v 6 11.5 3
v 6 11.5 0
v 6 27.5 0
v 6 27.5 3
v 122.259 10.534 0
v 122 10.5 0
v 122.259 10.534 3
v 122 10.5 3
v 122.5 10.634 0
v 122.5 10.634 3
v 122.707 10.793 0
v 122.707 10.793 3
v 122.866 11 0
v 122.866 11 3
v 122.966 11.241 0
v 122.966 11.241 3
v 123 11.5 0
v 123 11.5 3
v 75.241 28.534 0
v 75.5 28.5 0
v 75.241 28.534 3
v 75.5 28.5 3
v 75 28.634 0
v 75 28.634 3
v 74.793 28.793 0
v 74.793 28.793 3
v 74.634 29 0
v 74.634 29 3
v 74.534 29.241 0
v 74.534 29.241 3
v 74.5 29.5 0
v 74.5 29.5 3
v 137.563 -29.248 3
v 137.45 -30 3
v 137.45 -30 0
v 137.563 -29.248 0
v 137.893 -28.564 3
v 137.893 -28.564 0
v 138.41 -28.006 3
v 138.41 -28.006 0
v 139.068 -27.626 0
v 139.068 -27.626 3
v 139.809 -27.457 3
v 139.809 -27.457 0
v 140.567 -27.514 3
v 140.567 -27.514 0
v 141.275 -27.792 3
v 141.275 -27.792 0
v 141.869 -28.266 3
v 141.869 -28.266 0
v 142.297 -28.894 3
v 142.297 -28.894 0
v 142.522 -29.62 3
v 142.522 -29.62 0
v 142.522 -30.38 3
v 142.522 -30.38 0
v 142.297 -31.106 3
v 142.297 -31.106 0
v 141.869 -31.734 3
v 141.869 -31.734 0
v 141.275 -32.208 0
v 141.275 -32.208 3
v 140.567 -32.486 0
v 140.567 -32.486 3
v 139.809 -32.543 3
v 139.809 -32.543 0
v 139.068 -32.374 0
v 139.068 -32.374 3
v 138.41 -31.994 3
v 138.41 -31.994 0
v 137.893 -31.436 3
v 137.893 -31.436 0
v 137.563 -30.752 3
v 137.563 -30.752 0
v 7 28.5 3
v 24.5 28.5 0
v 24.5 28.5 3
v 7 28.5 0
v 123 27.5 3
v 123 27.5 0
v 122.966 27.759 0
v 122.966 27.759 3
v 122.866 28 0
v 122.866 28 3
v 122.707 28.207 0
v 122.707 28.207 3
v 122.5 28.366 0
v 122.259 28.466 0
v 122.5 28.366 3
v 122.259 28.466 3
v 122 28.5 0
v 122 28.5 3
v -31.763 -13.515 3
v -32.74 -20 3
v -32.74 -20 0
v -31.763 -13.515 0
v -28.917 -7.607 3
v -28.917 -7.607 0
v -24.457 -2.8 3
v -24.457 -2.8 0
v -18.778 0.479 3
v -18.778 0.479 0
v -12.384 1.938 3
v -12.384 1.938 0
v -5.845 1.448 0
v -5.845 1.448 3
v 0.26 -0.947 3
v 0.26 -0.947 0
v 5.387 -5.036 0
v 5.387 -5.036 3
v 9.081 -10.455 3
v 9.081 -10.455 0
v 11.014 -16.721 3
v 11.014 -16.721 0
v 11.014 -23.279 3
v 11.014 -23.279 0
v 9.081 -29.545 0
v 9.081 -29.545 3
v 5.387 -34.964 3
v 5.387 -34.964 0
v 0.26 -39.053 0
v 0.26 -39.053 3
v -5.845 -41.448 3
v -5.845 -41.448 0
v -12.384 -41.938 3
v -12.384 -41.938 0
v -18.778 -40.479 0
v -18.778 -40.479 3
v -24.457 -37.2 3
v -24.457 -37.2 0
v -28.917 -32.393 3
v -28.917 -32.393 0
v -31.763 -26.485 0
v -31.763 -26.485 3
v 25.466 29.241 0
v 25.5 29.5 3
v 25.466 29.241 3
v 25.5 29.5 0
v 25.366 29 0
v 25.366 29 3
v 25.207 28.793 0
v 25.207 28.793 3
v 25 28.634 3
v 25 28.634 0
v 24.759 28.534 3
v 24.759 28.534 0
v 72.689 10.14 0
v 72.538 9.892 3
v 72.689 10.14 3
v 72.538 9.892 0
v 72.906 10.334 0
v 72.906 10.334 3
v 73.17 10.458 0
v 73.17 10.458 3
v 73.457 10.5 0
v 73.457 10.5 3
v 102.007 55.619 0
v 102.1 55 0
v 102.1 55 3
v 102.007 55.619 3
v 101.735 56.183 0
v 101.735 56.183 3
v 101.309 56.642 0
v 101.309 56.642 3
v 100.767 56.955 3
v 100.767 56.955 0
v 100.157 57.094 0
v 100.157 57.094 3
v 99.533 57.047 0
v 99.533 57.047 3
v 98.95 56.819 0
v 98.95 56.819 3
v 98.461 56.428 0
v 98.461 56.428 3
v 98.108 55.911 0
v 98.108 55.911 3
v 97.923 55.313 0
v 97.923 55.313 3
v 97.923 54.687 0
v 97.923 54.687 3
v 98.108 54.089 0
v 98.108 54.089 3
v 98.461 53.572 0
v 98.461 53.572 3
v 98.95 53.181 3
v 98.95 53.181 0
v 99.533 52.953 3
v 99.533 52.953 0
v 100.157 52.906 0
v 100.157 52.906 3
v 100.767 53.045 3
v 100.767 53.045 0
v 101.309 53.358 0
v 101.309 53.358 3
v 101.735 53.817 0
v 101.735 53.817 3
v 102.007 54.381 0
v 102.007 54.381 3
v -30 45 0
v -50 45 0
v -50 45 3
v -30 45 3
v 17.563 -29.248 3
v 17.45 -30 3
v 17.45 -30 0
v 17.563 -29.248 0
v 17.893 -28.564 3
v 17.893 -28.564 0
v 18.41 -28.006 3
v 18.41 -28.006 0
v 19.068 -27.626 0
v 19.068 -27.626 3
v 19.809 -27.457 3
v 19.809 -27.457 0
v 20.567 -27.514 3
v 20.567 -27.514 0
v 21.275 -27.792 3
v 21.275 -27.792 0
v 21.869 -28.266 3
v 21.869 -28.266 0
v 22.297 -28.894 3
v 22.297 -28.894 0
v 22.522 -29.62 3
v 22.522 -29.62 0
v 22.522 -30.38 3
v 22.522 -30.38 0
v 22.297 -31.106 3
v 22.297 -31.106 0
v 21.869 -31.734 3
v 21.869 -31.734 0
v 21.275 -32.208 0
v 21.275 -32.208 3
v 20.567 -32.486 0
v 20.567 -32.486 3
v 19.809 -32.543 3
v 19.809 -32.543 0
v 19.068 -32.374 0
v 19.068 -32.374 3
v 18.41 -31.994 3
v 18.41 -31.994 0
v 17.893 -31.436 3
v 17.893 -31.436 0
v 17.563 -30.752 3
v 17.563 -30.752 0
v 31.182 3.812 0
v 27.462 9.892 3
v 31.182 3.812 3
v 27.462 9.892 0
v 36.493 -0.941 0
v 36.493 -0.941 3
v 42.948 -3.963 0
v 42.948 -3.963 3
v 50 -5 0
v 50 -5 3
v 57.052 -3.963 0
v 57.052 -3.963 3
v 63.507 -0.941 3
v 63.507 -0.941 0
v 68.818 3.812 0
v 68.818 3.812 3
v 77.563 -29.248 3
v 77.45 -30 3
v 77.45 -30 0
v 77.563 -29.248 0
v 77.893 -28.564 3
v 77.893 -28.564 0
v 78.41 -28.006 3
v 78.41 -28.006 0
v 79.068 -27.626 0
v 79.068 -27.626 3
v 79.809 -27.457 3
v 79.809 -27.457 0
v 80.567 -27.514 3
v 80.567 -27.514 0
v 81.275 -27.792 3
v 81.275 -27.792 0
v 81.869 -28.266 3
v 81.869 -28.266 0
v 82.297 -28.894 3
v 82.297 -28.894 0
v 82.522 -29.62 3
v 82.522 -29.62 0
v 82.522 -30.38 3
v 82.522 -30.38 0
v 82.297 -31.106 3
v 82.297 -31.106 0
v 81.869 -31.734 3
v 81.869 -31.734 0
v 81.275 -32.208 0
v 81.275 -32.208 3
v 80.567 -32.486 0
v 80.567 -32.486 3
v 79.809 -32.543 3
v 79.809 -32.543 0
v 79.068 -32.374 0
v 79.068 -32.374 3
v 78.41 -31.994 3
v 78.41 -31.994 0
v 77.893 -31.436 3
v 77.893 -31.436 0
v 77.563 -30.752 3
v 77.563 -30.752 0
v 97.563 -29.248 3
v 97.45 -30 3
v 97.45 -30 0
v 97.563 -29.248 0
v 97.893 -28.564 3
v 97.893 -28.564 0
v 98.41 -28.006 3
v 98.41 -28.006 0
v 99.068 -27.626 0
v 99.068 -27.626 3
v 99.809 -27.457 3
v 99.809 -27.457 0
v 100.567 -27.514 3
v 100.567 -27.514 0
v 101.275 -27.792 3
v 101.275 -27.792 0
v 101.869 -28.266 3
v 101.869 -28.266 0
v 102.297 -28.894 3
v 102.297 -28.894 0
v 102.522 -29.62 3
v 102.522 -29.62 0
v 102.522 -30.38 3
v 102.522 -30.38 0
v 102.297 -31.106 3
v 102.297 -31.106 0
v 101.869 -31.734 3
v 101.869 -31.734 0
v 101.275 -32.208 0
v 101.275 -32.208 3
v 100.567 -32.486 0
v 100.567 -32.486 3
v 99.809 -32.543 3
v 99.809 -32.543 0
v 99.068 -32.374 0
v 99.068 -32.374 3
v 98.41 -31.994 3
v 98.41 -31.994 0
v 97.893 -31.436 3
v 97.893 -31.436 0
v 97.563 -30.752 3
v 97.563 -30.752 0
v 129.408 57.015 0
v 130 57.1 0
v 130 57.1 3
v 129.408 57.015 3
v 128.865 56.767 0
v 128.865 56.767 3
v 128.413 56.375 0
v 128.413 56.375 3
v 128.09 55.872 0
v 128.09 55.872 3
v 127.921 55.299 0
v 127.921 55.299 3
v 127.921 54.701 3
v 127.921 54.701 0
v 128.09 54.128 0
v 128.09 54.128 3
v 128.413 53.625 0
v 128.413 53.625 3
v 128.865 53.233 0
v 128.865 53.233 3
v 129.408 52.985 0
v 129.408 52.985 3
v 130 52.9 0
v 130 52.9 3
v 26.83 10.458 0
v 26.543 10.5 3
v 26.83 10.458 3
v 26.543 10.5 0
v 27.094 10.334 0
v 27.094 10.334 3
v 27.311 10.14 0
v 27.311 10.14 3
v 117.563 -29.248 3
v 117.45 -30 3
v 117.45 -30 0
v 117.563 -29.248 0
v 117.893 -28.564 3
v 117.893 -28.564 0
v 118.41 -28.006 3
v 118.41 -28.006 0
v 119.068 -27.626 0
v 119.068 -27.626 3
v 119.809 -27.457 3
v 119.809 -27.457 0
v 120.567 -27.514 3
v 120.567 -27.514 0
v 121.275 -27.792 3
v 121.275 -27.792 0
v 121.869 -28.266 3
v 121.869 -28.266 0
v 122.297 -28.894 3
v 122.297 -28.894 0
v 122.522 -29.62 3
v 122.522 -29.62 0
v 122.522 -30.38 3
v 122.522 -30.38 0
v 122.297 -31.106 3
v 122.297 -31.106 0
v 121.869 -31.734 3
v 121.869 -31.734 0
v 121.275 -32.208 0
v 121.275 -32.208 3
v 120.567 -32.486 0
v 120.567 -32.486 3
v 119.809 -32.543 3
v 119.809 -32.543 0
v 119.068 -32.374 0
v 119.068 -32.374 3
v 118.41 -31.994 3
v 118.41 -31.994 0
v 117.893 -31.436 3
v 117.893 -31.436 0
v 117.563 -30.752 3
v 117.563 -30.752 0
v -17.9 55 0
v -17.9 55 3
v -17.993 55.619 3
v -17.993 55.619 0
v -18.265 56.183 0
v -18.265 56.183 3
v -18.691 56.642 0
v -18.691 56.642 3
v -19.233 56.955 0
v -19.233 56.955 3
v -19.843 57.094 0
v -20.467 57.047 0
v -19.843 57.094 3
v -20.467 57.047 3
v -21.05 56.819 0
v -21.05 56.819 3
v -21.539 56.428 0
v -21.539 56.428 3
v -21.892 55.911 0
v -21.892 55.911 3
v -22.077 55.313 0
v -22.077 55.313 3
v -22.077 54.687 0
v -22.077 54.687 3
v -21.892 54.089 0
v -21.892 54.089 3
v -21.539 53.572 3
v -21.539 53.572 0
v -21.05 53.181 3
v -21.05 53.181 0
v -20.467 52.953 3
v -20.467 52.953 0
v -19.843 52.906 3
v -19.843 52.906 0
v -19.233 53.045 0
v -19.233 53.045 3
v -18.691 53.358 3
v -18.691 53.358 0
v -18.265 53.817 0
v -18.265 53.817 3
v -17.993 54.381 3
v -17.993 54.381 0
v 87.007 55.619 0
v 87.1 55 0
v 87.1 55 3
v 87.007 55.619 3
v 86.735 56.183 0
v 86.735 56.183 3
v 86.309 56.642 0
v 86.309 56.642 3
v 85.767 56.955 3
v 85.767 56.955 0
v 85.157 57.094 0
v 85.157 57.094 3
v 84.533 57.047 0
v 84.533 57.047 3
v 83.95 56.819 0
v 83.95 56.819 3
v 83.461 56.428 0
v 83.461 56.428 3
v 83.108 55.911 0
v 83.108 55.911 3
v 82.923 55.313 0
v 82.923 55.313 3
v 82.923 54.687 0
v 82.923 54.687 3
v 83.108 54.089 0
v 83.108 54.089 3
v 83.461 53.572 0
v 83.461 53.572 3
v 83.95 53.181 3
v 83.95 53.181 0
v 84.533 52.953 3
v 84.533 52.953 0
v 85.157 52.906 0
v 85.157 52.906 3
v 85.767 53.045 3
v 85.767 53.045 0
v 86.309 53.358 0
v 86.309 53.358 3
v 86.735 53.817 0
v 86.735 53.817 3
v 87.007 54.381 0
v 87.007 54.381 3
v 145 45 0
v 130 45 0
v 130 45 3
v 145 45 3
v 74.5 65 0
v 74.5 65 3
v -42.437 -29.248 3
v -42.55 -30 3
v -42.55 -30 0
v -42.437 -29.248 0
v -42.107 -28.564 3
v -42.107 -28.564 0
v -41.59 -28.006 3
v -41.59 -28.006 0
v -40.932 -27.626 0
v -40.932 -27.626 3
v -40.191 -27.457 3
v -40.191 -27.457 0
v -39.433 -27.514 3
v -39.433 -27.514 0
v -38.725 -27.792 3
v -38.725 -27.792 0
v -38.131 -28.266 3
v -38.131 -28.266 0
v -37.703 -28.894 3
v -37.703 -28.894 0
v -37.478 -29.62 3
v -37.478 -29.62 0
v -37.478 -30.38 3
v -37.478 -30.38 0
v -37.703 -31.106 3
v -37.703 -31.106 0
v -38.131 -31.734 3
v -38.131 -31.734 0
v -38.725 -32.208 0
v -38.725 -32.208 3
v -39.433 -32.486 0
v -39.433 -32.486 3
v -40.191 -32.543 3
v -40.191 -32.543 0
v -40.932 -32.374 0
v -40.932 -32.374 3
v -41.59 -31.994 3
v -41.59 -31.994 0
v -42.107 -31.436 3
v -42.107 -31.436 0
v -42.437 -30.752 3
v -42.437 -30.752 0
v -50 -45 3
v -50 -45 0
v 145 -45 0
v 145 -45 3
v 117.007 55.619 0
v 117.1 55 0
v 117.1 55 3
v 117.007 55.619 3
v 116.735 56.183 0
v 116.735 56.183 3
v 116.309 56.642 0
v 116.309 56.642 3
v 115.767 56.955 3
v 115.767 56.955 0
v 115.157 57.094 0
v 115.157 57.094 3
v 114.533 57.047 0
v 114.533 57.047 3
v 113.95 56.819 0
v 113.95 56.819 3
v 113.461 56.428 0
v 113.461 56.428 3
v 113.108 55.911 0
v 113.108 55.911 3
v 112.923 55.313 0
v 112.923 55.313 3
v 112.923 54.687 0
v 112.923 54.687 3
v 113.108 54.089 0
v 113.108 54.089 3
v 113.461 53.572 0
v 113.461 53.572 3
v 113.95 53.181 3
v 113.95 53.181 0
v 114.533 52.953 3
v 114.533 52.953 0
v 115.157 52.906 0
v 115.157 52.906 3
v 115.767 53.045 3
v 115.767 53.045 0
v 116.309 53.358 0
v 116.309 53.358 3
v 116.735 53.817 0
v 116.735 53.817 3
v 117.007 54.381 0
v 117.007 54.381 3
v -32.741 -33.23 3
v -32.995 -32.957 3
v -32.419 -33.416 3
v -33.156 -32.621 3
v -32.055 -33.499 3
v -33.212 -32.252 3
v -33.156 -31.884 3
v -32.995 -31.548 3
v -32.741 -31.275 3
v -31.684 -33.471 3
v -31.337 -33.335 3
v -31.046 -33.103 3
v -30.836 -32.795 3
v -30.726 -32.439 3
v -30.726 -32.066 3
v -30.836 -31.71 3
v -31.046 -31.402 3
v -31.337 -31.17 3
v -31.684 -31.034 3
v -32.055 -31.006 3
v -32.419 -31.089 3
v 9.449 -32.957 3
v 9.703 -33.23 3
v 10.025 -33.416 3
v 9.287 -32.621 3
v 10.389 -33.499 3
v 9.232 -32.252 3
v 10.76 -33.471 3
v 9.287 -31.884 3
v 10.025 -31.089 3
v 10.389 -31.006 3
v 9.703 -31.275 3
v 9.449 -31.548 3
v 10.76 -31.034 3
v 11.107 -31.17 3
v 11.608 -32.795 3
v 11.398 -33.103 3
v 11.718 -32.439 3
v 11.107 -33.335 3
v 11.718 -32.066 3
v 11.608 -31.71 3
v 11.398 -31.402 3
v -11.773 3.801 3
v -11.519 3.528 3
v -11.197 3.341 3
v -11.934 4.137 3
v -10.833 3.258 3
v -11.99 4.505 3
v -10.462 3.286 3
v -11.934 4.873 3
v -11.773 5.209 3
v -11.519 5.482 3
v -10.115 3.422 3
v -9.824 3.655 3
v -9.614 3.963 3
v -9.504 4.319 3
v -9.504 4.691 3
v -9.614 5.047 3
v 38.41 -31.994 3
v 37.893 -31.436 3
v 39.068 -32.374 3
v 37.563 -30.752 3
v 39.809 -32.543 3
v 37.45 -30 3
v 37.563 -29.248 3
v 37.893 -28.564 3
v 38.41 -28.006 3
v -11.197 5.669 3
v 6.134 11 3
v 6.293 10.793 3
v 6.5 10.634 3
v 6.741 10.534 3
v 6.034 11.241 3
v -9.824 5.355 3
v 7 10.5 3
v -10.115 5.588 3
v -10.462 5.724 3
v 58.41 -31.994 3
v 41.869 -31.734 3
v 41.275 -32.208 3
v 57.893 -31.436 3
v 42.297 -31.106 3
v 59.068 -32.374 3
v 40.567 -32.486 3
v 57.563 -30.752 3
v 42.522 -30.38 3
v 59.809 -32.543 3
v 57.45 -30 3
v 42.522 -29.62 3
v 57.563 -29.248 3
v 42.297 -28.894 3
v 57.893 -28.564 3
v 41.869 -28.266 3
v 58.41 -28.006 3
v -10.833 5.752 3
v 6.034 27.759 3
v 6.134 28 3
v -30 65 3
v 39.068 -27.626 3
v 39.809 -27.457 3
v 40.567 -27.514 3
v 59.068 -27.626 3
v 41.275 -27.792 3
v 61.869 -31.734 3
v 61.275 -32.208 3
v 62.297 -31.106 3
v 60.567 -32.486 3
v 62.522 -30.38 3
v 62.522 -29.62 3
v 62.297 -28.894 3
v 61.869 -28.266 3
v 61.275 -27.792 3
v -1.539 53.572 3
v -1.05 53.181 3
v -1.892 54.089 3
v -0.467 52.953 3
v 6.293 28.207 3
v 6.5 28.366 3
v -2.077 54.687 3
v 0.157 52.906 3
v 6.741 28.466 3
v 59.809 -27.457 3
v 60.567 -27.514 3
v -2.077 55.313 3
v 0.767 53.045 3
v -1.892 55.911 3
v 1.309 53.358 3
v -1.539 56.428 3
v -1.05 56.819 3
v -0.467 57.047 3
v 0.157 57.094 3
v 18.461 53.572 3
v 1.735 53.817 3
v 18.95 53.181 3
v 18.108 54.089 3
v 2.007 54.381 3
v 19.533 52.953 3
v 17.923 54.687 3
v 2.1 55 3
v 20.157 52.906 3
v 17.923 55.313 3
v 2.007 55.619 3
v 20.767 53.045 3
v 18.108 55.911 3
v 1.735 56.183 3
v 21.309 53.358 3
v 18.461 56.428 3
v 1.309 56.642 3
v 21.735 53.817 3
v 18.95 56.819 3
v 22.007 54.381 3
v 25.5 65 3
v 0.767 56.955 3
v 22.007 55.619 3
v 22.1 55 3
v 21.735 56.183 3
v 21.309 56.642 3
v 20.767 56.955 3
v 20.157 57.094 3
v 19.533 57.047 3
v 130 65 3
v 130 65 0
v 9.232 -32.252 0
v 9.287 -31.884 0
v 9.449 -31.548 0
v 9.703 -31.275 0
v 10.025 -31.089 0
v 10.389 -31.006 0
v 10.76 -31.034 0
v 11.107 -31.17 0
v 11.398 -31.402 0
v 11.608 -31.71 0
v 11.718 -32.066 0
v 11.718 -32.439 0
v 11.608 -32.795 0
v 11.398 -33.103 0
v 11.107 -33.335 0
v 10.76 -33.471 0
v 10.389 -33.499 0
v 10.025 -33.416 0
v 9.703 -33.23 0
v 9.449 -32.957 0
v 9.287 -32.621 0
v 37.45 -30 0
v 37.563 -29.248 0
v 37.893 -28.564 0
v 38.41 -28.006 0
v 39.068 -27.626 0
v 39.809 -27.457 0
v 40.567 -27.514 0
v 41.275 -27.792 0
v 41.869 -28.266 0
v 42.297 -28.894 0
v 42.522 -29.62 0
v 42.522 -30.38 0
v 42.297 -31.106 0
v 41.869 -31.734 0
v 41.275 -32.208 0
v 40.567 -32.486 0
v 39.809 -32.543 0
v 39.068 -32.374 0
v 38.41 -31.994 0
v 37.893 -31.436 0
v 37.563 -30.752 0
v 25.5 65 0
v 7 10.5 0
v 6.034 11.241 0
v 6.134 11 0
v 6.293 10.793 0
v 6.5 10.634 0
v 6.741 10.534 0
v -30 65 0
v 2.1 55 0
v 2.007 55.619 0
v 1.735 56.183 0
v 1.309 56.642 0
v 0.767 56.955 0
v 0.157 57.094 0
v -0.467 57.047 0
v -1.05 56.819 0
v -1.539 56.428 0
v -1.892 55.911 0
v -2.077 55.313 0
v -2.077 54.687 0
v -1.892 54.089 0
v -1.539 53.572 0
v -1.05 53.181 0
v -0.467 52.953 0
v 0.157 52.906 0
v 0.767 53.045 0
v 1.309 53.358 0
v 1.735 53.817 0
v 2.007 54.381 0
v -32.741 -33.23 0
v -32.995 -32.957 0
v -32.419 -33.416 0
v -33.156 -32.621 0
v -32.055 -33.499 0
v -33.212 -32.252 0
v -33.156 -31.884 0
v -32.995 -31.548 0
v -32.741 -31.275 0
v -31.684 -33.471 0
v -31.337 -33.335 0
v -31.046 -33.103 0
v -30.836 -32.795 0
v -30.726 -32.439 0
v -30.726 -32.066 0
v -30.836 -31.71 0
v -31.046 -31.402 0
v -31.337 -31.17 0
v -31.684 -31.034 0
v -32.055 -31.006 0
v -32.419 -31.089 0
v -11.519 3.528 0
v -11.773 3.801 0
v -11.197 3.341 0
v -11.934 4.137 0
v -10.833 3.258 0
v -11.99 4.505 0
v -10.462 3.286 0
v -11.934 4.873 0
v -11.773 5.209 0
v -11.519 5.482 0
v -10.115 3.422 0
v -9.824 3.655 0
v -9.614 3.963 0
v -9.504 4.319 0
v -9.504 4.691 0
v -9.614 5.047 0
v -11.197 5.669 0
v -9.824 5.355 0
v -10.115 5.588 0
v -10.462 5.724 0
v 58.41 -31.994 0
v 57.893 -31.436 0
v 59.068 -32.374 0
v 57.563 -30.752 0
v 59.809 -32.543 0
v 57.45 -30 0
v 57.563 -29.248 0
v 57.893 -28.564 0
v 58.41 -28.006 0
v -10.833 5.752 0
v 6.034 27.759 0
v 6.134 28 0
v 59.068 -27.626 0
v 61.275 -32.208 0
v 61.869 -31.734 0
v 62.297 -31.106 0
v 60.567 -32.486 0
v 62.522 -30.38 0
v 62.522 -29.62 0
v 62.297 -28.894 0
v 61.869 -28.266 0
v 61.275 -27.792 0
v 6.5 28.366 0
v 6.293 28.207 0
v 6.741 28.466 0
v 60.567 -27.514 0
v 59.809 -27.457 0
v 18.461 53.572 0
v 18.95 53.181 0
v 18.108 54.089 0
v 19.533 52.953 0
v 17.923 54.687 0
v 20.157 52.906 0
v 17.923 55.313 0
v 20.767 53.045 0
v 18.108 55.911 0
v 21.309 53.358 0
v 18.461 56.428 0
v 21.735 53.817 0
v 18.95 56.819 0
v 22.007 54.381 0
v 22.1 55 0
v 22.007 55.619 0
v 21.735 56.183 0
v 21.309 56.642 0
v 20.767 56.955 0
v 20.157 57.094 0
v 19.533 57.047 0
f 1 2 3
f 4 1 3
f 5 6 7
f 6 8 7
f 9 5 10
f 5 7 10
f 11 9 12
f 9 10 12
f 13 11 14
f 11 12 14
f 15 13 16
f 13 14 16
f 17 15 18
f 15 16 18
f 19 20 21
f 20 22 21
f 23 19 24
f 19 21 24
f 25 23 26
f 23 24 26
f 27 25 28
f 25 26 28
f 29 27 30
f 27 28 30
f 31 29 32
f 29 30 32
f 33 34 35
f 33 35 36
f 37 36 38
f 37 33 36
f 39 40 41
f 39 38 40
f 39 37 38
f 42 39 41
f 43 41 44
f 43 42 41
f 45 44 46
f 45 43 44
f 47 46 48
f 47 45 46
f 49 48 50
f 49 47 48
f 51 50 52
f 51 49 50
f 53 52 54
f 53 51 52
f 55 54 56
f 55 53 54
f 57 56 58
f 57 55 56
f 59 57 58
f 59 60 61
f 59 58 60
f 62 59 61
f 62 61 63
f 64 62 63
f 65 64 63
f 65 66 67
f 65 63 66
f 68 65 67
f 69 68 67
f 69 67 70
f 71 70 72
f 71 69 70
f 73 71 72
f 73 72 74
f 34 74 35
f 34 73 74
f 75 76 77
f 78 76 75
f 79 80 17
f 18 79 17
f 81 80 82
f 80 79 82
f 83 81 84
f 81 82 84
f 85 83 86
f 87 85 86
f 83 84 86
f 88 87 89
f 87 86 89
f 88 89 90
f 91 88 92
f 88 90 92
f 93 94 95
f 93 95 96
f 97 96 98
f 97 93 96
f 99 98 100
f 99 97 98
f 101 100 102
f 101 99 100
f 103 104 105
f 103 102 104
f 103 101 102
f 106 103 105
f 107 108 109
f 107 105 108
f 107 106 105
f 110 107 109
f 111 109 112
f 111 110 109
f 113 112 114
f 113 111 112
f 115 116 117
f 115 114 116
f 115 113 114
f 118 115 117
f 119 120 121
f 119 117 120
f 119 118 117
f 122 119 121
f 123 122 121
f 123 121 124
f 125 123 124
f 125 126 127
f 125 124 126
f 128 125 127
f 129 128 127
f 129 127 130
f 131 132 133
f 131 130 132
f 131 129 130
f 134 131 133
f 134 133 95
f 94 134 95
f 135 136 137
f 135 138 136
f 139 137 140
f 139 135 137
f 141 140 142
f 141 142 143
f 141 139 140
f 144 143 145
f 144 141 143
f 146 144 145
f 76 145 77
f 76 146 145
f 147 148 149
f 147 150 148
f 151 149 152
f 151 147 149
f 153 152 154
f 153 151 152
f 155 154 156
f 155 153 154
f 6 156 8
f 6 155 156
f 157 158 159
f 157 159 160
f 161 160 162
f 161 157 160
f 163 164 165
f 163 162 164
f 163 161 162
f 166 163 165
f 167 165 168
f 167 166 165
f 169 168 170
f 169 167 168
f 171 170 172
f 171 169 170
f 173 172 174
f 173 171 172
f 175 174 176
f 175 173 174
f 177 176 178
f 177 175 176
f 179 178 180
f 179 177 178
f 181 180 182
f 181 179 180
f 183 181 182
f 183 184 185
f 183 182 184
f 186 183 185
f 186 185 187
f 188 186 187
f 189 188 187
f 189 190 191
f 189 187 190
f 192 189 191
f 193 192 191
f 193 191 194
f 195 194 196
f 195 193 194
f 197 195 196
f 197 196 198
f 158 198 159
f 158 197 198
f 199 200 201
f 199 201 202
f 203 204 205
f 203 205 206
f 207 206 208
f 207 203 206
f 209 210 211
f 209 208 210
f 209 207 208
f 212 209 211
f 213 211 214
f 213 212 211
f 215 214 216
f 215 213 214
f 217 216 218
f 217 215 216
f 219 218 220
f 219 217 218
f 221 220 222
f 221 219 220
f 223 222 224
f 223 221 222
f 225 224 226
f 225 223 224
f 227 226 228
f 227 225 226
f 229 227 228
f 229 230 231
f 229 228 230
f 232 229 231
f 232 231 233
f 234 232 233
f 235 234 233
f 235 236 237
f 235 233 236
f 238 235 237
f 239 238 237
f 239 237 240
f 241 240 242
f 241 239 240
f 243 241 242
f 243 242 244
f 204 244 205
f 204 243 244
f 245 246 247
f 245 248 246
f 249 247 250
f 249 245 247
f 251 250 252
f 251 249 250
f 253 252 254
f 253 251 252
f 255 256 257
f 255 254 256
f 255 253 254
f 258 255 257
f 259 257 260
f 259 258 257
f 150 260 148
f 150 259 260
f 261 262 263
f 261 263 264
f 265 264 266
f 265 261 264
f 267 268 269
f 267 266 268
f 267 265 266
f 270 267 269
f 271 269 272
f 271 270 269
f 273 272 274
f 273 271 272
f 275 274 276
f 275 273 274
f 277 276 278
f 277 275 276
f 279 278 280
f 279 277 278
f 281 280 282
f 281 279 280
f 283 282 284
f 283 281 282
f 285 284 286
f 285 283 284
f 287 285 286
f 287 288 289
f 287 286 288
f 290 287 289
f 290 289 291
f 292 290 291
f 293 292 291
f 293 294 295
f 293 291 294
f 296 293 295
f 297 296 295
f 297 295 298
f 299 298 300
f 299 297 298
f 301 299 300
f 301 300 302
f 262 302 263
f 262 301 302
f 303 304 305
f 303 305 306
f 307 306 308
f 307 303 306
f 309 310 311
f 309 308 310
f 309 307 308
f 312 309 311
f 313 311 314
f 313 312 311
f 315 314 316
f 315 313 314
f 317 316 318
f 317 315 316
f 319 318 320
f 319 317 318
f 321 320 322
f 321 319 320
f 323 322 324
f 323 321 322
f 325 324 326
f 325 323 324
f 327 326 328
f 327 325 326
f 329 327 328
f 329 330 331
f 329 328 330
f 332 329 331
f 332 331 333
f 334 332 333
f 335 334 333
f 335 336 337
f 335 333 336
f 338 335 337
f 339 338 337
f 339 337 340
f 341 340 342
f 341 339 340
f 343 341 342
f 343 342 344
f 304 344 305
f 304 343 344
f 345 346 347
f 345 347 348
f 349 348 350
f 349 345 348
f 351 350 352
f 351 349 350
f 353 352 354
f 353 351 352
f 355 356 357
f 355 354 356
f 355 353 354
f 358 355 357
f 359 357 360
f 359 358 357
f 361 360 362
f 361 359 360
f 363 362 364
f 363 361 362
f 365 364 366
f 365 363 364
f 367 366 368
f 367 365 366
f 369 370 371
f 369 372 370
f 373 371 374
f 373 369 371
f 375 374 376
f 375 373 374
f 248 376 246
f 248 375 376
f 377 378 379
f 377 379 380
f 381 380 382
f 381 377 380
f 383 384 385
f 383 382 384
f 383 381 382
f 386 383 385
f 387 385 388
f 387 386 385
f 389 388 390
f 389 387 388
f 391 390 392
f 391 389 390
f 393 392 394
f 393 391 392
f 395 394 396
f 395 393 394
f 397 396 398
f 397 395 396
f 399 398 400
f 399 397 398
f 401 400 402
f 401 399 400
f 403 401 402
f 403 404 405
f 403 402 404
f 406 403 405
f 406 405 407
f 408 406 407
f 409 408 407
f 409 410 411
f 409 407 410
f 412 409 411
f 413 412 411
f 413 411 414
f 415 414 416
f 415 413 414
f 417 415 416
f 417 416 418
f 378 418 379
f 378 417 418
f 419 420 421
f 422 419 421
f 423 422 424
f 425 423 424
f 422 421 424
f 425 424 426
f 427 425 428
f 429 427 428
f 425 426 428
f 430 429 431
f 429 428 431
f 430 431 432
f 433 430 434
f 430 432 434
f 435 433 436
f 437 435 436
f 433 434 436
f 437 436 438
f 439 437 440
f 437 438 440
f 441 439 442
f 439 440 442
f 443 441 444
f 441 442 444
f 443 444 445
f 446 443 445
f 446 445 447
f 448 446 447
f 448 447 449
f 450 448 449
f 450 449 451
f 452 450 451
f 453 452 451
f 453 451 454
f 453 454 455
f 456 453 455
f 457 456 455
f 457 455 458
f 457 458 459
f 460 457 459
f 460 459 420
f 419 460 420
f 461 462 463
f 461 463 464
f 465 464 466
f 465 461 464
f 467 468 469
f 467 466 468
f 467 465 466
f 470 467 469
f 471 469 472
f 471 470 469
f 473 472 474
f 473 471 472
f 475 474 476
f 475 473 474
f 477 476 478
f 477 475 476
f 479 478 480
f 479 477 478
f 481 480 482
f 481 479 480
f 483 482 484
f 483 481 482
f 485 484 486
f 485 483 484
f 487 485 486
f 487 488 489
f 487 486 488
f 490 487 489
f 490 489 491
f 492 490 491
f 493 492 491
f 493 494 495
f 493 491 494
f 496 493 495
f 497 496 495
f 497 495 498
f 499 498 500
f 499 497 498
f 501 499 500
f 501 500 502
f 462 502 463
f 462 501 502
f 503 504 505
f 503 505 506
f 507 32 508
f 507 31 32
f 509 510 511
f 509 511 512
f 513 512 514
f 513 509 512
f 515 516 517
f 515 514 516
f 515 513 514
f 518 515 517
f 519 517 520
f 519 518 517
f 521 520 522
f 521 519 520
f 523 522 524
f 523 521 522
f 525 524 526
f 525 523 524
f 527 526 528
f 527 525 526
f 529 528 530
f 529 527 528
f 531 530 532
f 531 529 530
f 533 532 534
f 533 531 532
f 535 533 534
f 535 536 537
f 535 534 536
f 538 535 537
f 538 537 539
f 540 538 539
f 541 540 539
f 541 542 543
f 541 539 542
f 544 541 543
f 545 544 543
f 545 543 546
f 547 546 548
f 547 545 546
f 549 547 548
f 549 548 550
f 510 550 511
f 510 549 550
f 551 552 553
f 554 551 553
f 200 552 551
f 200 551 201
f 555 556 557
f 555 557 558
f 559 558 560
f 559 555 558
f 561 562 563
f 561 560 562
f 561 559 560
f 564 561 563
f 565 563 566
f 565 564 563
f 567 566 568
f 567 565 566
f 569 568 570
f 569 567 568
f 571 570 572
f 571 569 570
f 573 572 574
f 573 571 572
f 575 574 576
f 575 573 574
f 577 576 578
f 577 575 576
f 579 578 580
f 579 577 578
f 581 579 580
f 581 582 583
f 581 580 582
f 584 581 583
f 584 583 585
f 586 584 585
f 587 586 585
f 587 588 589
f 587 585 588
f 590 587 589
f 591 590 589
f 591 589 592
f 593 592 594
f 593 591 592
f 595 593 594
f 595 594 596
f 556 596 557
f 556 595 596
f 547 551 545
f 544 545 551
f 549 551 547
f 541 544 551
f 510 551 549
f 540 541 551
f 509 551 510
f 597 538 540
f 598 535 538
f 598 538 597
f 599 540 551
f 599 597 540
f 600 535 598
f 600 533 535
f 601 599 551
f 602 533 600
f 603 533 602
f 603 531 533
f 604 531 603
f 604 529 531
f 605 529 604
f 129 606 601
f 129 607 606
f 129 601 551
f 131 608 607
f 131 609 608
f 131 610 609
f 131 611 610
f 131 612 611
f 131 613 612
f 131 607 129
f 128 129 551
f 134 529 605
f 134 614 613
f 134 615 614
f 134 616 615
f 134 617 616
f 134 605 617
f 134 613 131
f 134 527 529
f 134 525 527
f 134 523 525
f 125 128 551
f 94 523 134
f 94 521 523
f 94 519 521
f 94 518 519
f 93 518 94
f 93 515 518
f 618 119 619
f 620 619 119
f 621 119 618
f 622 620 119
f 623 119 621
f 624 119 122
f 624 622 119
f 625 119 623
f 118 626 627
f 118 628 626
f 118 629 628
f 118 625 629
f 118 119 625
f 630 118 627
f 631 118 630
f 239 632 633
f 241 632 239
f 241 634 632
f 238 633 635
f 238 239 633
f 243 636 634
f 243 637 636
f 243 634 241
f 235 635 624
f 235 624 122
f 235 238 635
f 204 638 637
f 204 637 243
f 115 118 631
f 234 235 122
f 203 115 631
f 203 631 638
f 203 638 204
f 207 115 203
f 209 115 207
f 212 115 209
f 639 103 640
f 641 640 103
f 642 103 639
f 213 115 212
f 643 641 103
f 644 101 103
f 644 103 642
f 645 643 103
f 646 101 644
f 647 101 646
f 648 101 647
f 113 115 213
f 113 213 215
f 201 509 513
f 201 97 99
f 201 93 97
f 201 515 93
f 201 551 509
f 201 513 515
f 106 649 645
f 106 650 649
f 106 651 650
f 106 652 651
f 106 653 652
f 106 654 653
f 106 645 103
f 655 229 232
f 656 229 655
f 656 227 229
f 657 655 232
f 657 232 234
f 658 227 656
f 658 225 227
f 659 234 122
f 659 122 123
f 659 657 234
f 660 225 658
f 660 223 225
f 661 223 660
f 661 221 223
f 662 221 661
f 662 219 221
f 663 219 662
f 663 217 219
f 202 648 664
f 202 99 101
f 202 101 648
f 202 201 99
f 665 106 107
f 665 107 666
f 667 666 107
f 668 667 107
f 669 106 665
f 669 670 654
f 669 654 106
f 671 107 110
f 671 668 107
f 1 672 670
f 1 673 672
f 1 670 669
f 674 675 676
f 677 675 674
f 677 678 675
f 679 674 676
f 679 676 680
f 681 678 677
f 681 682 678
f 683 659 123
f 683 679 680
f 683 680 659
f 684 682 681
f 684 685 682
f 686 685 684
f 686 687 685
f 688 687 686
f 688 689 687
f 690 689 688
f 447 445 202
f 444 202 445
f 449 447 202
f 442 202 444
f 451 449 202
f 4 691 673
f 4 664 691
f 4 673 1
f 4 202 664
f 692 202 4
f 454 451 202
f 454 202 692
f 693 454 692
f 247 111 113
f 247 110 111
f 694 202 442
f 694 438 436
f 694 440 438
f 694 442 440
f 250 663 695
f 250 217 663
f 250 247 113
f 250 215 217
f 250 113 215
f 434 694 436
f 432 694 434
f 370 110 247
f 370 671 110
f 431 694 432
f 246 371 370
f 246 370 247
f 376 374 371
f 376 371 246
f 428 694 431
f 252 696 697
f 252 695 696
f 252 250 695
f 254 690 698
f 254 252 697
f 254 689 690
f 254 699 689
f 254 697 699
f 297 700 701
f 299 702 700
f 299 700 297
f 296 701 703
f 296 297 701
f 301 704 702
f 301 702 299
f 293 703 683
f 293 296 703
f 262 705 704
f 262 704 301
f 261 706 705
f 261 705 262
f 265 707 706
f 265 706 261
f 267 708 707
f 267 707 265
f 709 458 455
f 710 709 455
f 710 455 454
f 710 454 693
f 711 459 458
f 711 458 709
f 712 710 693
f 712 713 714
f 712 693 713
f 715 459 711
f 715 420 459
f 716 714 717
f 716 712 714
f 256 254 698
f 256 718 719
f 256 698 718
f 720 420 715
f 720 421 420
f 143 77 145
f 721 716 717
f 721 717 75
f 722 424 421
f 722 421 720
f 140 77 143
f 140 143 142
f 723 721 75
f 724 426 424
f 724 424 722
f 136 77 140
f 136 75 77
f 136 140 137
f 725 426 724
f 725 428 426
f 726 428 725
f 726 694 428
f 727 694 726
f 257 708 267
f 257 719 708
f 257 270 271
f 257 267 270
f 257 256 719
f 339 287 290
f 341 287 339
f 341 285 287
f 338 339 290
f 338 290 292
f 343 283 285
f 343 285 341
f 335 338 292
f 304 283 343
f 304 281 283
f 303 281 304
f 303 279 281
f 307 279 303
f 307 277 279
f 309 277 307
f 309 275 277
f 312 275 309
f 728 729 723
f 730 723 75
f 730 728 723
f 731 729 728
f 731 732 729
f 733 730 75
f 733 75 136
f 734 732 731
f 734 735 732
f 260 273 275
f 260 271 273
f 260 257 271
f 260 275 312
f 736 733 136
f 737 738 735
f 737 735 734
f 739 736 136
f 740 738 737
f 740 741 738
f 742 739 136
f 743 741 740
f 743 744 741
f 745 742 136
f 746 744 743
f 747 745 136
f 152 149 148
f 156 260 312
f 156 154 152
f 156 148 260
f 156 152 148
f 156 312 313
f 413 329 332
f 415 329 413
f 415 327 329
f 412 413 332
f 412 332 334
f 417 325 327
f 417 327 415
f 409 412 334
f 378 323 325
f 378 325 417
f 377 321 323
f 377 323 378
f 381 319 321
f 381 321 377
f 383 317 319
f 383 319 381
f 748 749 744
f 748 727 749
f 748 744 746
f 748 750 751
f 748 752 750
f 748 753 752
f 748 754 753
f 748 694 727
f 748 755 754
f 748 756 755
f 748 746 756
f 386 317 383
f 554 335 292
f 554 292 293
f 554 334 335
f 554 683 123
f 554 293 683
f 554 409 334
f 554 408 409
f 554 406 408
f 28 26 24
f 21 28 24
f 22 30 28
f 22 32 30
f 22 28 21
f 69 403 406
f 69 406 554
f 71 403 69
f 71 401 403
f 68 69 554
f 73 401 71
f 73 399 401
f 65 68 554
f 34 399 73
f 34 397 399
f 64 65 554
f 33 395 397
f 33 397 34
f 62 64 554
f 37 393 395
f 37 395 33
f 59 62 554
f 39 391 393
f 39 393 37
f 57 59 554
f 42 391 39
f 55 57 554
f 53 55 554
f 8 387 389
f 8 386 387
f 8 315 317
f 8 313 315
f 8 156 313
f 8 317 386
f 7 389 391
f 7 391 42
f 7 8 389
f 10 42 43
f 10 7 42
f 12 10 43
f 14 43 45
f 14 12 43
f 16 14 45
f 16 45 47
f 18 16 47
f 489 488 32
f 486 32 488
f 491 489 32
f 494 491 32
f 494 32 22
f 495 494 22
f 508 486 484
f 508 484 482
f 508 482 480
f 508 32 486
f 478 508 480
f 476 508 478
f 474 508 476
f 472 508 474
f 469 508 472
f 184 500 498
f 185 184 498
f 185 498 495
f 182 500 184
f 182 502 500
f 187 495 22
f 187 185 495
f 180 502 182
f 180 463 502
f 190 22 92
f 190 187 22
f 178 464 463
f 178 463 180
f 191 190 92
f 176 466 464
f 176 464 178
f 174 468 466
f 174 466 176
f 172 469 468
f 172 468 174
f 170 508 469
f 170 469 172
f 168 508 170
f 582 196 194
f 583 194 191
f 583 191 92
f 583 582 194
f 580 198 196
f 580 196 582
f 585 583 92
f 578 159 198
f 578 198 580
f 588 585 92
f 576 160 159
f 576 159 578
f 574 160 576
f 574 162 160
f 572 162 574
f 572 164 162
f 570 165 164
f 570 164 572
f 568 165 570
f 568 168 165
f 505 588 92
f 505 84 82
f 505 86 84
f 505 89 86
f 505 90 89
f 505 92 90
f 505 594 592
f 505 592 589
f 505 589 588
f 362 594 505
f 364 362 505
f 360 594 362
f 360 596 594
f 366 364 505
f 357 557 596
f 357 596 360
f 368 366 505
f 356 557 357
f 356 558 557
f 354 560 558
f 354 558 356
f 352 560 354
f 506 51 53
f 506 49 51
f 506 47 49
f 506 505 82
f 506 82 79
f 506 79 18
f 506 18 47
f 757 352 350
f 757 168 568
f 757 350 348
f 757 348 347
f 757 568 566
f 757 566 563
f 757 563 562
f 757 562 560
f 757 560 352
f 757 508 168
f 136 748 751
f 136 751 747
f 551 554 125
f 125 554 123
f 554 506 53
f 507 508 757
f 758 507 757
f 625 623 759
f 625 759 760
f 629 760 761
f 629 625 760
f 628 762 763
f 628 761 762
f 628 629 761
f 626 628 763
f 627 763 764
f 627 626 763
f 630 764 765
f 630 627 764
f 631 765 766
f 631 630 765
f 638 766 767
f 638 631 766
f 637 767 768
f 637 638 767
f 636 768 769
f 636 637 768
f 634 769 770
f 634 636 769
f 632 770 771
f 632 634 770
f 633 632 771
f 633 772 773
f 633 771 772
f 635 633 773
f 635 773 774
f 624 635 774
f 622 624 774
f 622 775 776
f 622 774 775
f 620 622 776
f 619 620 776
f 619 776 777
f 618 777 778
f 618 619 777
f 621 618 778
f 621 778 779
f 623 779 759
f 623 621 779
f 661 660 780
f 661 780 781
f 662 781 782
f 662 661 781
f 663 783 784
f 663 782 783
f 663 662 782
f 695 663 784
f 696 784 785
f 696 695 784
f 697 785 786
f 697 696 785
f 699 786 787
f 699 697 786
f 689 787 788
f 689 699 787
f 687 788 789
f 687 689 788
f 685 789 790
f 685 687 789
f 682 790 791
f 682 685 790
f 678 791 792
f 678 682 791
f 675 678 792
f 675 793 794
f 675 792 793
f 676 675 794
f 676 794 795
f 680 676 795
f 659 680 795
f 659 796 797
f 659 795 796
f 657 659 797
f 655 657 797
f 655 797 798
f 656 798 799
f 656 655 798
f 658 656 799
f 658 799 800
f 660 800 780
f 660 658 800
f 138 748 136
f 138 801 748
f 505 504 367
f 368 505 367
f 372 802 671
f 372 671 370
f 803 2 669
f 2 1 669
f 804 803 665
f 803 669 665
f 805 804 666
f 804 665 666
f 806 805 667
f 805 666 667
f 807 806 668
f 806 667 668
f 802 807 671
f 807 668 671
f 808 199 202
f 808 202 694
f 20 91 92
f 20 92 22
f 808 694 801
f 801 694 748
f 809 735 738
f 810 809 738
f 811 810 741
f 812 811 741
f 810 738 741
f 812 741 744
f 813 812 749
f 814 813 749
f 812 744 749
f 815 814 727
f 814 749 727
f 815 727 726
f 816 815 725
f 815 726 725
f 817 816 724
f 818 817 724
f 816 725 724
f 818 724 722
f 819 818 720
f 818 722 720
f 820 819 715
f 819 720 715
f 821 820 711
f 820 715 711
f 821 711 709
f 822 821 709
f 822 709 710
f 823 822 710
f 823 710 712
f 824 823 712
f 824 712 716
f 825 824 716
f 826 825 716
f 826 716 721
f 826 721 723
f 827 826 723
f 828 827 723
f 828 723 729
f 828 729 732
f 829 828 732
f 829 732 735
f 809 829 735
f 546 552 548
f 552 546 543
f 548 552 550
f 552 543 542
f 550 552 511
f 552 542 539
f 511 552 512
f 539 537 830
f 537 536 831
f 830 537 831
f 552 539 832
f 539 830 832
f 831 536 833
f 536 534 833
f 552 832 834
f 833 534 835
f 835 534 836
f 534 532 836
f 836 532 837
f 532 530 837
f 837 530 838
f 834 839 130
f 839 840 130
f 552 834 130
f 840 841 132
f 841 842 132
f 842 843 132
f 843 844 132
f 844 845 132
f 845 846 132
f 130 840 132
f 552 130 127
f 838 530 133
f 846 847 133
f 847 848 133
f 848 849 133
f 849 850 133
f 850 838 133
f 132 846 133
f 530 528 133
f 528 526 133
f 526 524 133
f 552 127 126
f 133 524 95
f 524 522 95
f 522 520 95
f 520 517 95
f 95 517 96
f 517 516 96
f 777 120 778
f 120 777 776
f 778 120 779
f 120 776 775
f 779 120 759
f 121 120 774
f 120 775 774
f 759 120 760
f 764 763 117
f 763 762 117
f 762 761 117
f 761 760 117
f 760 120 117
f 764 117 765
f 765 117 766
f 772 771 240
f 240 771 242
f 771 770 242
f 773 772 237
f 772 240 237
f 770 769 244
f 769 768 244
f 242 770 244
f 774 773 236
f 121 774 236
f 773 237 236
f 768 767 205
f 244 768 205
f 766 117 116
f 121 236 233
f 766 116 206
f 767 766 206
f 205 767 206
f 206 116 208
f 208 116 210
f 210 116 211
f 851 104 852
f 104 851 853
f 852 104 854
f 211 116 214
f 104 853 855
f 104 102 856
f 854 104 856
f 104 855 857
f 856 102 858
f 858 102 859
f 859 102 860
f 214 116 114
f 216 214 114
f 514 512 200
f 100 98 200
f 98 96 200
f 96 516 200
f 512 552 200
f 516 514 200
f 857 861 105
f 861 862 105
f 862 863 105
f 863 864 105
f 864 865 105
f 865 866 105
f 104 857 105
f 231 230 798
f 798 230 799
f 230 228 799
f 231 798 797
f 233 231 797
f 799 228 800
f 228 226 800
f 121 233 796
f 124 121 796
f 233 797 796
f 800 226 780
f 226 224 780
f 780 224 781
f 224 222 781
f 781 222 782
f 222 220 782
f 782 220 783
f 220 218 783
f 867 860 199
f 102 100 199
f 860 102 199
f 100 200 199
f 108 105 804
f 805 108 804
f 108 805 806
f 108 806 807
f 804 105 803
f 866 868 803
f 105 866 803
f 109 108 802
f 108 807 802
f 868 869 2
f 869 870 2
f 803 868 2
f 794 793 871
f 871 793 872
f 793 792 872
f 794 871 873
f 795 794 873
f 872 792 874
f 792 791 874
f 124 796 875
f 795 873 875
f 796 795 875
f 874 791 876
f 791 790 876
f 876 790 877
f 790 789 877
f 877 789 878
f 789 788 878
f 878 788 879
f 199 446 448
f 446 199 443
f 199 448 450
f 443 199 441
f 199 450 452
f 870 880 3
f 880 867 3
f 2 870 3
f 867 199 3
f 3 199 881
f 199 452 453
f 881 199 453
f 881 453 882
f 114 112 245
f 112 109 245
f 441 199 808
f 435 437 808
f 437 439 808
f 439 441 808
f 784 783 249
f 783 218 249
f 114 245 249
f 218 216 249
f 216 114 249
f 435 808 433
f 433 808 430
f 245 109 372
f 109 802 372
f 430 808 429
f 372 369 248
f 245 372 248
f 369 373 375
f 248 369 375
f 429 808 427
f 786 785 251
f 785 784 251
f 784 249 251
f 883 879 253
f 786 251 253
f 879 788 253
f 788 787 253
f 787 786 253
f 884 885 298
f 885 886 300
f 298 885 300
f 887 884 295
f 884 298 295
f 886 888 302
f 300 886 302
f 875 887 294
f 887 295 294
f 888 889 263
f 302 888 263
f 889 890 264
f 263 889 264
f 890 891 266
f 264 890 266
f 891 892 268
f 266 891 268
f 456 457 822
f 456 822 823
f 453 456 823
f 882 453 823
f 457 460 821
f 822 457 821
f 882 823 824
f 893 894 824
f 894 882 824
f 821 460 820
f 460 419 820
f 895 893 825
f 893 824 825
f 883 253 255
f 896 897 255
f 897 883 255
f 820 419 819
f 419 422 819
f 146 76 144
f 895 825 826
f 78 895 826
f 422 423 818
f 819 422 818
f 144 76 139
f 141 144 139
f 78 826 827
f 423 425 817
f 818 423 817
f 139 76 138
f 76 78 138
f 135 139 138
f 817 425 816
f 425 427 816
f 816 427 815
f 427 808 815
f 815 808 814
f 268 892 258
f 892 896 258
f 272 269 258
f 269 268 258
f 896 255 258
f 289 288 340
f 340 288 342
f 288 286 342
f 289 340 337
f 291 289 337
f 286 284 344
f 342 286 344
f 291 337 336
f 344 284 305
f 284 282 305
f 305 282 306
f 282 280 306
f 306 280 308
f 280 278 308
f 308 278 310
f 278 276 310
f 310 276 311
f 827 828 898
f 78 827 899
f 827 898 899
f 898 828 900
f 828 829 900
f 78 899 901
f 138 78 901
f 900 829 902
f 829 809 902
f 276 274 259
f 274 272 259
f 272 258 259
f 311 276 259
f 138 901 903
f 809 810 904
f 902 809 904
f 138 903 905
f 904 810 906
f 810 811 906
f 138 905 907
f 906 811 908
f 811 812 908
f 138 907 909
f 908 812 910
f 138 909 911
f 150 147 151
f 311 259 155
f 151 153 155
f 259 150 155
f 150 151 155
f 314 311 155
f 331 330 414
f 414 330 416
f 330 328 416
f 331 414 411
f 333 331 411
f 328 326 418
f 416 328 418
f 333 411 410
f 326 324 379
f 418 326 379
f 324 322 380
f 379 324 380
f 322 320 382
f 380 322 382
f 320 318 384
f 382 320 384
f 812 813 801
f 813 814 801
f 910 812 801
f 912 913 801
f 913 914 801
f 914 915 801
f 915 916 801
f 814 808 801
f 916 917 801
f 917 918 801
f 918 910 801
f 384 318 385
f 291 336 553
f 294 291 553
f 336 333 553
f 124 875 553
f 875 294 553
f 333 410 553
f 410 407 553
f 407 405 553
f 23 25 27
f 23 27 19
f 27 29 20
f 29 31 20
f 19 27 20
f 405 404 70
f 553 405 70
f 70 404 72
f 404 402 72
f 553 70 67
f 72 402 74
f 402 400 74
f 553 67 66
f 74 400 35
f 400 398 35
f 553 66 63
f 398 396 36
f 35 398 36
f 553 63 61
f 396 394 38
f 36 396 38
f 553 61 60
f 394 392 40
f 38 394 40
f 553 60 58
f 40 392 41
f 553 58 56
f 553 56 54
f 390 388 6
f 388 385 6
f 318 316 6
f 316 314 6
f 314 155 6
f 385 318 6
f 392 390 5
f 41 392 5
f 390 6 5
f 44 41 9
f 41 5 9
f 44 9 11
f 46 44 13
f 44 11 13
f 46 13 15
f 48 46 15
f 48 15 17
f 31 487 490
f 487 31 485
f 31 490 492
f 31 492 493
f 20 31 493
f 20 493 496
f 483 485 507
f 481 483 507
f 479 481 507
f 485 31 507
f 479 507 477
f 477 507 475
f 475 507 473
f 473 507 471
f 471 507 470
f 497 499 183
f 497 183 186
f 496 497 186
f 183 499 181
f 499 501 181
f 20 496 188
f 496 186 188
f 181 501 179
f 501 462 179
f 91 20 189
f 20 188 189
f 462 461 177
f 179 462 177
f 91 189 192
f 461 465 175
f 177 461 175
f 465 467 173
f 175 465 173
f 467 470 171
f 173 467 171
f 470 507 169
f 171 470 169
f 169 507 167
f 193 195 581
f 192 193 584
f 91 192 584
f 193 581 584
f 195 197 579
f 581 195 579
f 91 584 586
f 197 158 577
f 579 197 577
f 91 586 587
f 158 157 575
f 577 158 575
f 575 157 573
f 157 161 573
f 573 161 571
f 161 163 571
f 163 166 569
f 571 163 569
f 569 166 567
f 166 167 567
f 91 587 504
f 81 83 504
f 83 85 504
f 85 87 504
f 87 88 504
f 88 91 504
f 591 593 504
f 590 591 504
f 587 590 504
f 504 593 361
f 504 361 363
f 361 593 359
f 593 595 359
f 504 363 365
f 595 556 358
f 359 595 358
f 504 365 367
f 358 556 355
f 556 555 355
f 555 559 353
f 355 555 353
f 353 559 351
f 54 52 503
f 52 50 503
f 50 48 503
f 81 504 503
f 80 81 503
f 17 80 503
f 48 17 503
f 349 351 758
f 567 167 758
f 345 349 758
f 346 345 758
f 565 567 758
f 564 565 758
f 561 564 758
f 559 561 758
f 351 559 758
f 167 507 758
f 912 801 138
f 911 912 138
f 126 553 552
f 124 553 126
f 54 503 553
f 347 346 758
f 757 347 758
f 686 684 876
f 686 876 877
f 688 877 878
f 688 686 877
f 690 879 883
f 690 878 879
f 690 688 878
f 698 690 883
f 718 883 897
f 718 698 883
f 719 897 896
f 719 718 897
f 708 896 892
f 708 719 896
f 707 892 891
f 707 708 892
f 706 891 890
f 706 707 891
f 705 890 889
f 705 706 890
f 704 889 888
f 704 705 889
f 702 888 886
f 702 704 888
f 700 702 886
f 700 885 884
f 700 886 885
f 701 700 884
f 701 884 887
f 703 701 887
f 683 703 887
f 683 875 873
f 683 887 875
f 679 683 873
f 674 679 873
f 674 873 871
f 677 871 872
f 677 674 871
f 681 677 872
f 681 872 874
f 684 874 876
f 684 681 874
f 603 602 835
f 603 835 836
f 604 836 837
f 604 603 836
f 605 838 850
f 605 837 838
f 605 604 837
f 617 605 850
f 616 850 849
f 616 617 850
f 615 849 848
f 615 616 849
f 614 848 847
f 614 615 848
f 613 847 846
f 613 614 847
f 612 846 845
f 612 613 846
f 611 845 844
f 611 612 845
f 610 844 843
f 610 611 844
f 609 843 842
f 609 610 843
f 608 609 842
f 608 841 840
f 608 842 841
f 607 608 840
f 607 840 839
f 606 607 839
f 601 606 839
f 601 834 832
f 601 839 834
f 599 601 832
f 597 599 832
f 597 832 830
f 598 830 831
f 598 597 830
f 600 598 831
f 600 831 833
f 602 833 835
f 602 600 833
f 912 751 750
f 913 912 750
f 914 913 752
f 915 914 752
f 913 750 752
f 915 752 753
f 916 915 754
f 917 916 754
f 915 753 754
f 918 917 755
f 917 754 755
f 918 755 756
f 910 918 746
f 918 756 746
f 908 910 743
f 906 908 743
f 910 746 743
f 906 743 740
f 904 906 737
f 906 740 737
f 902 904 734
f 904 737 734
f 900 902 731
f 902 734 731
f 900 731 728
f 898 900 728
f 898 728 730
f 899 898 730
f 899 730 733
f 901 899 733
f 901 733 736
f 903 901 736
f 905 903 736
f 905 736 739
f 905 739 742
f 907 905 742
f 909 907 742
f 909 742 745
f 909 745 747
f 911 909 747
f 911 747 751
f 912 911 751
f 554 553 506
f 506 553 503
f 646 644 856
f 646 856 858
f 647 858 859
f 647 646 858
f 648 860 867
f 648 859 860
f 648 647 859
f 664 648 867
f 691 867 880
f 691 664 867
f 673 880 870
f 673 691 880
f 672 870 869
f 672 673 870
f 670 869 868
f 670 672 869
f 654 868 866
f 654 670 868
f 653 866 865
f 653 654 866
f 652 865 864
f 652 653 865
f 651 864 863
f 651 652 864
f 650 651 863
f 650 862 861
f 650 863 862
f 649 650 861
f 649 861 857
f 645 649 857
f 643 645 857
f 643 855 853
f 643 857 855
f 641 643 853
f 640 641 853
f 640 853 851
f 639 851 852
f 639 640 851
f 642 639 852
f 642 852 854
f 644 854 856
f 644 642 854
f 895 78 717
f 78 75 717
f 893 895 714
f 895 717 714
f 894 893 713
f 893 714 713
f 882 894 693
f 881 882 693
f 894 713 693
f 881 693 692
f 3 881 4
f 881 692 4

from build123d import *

# Parameters (mm, degrees)
SKETCH_1_W                = 100
SKETCH_1_H                = 130
EXTRUDE_1_DEPTH           = 3
SKETCH_2_R                = 2.1
CUT_EXTRUDE_1_DEPTH       = 83.060952956
SKETCH_5_W                = 100
SKETCH_5_H                = 130
EXTRUDE_2_DEPTH           = 3
CUT_EXTRUDE_4_DEPTH       = 164.505351594
CUT_EXTRUDE_4_DEPTH_BACK  = 164.505351594
SKETCH_6_R                = 2.1
CUT_EXTRUDE_5_DEPTH       = 164.505351594
CUT_EXTRUDE_5_DEPTH_BACK  = 164.505351594
SKETCH_7_R                = 2.55
CUT_EXTRUDE_6_DEPTH       = 164.505351594
CUT_EXTRUDE_6_DEPTH_BACK  = 164.505351594
CUT_EXTRUDE_7_DEPTH       = 164.505351594
CUT_EXTRUDE_7_DEPTH_BACK  = 164.505351594
SKETCH_12_W               = 20
SKETCH_12_H               = 20
CUT_EXTRUDE_8_DEPTH       = 164.505351594
CUT_EXTRUDE_8_DEPTH_BACK  = 164.505351594
SKETCH_13_W               = 200
SKETCH_13_H               = 20
CUT_EXTRUDE_9_DEPTH       = 164.505351594
CUT_EXTRUDE_9_DEPTH_BACK  = 164.505351594
SKETCH_14_W               = 5
SKETCH_14_H               = 90
CUT_EXTRUDE_10_DEPTH      = 159.930802553
CUT_EXTRUDE_10_DEPTH_BACK = 159.930802553
SKETCH_15_R               = 1.25
SKETCH_15_R_2             = 22
CUT_EXTRUDE_11_DEPTH      = 159.930802553
CUT_EXTRUDE_11_DEPTH_BACK = 159.930802553
FILLET_1_R                = 1


with BuildPart() as part:
    # 草图1 → 凸台-拉伸1 (new body)
    with BuildSketch(Plane.XY):
        Rectangle(SKETCH_1_W, SKETCH_1_H)
    extrude(amount=EXTRUDE_1_DEPTH)

    # 草图2 → 切除-拉伸1 (cut, through all)
    with BuildSketch(Plane.XY.offset(3)):
        with Locations((-40, 55)):
            Circle(SKETCH_2_R)
        with Locations((-20, 55)):
            Circle(SKETCH_2_R)
        with Locations((0, 55)):
            Circle(SKETCH_2_R)
        with Locations((20, 55)):
            Circle(SKETCH_2_R)
        with Locations((40, 55)):
            Circle(SKETCH_2_R)
        with Locations((-40, -55)):
            Circle(SKETCH_2_R)
        with Locations(Location((40, -55, 0), (0, 0, 180))):
            Circle(SKETCH_2_R)
        with Locations(Location((20, -55, 0), (0, 0, 180))):
            Circle(SKETCH_2_R)
        with Locations(Location((0, -55, 0), (0, 0, 180))):
            Circle(SKETCH_2_R)
        with Locations(Location((-20, -55, 0), (0, 0, 180))):
            Circle(SKETCH_2_R)
    extrude(amount=-CUT_EXTRUDE_1_DEPTH, mode=Mode.SUBTRACT)

    # 草图5 → 凸台-拉伸2 (add)
    with BuildSketch(Plane.XY.offset(3)):
        with Locations((100, 0)):
            Rectangle(SKETCH_5_W, SKETCH_5_H)
    extrude(amount=-EXTRUDE_2_DEPTH)

    # 草图6 → 切除-拉伸4 (cut, two sides: drawn at the far end of the back side and taken through both)
    with BuildSketch(Plane.XY.offset(3).offset(-CUT_EXTRUDE_4_DEPTH_BACK)):
        with Locations((55, 55)):
            Circle(SKETCH_6_R)
        with Locations((70, 55)):
            Circle(SKETCH_6_R)
        with Locations((85, 55)):
            Circle(SKETCH_6_R)
        with Locations((100, 55)):
            Circle(SKETCH_6_R)
        with Locations((115, 55)):
            Circle(SKETCH_6_R)
        with Locations((130, 55)):
            Circle(SKETCH_6_R)
        with Locations((145, 55)):
            Circle(SKETCH_6_R)
        with Locations((145, -55)):
            Circle(SKETCH_6_R)
        with Locations((130, -55)):
            Circle(SKETCH_6_R)
        with Locations((115, -55)):
            Circle(SKETCH_6_R)
        with Locations((100, -55)):
            Circle(SKETCH_6_R)
        with Locations((85, -55)):
            Circle(SKETCH_6_R)
        with Locations((70, -55)):
            Circle(SKETCH_6_R)
        with Locations((55, -55)):
            Circle(SKETCH_6_R)
    extrude(amount=CUT_EXTRUDE_4_DEPTH + CUT_EXTRUDE_4_DEPTH_BACK, mode=Mode.SUBTRACT)

    # 草图7 → 切除-拉伸5 (cut, two sides: drawn at the far end of the back side and taken through both)
    with BuildSketch(Plane(origin=(0, 0, 0), x_dir=(-1, 0, 0), z_dir=(0, 0, -1)).offset(-CUT_EXTRUDE_5_DEPTH_BACK)):
        with Locations((-140, -30)):
            Circle(SKETCH_7_R)
        with Locations((-120, -30)):
            Circle(SKETCH_7_R)
        with Locations((-100, -30)):
            Circle(SKETCH_7_R)
        with Locations((-80, -30)):
            Circle(SKETCH_7_R)
        with Locations((-60, -30)):
            Circle(SKETCH_7_R)
        with Locations((-40, -30)):
            Circle(SKETCH_7_R)
        with Locations((-20, -30)):
            Circle(SKETCH_7_R)
        with Locations((0, -30)):
            Circle(SKETCH_7_R)
        with Locations((20, -30)):
            Circle(SKETCH_7_R)
        with Locations((40, -30)):
            Circle(SKETCH_7_R)
    extrude(amount=CUT_EXTRUDE_5_DEPTH + CUT_EXTRUDE_5_DEPTH_BACK, mode=Mode.SUBTRACT)

    # 草图11 → 切除-拉伸6 (cut, two sides: drawn at the far end of the back side and taken through both)
    with BuildSketch(Plane.XY.offset(3).offset(-CUT_EXTRUDE_6_DEPTH_BACK)):
        with BuildLine():
            Line((74.5, 19.5), (74.5, 65))
            Line((74.5, 65), (25.5, 65))
            Line((25.5, 65), (25.5, 19.5))
            ThreePointArc((25.5, 19.5), (50, -5), (74.5, 19.5))
        make_face()
    extrude(amount=CUT_EXTRUDE_6_DEPTH + CUT_EXTRUDE_6_DEPTH_BACK, mode=Mode.SUBTRACT)

    # 草图12 → 切除-拉伸7 (cut, two sides: drawn at the far end of the back side and taken through both)
    with BuildSketch(Plane.XY.offset(3).offset(-CUT_EXTRUDE_7_DEPTH_BACK)):
        with Locations((-40, 55)):
            Rectangle(SKETCH_12_W, SKETCH_12_H)
        with Locations((140, 55)):
            Rectangle(SKETCH_12_W, SKETCH_12_H)
    extrude(amount=CUT_EXTRUDE_7_DEPTH + CUT_EXTRUDE_7_DEPTH_BACK, mode=Mode.SUBTRACT)

    # 草图13 → 切除-拉伸8 (cut, two sides: drawn at the far end of the back side and taken through both)
    with BuildSketch(Plane.XY.offset(3).offset(-CUT_EXTRUDE_8_DEPTH_BACK)):
        with Locations((50, -55)):
            Rectangle(SKETCH_13_W, SKETCH_13_H)
    extrude(amount=CUT_EXTRUDE_8_DEPTH + CUT_EXTRUDE_8_DEPTH_BACK, mode=Mode.SUBTRACT)

    # 草图14 → 切除-拉伸9 (cut, two sides: drawn at the far end of the back side and taken through both)
    with BuildSketch(Plane.XY.offset(3).offset(-CUT_EXTRUDE_9_DEPTH_BACK)):
        with Locations((147.5, 0)):
            Rectangle(SKETCH_14_W, SKETCH_14_H)
    extrude(amount=CUT_EXTRUDE_9_DEPTH + CUT_EXTRUDE_9_DEPTH_BACK, mode=Mode.SUBTRACT)

    # 草图15 → 切除-拉伸10 (cut, two sides: drawn at the far end of the back side and taken through both)
    with BuildSketch(Plane(origin=(0, 0, 0), x_dir=(-1, 0, 0), z_dir=(0, 0, -1)).offset(-CUT_EXTRUDE_10_DEPTH_BACK)):
        with Locations((10.74, 4.505)):
            Circle(SKETCH_15_R)
        with Locations((31.96195252, -32.2525)):
            Circle(SKETCH_15_R)
        with Locations((-10.48195252, -32.2525)):
            Circle(SKETCH_15_R)
        with Locations((10.74, -20)):
            Circle(SKETCH_15_R_2)
    extrude(amount=CUT_EXTRUDE_10_DEPTH + CUT_EXTRUDE_10_DEPTH_BACK, mode=Mode.SUBTRACT)

    # 草图16 → 切除-拉伸11 (cut, two sides: drawn at the far end of the back side and taken through both)
    with BuildSketch(Plane.XY.offset(3).offset(-CUT_EXTRUDE_11_DEPTH_BACK)):
        Polygon((6, 10.5), (6, 28.5), (25.5, 28.5), (74.5, 28.5), (123, 28.5), (123, 10.5), (74.5, 10.5), (25.5, 10.5), align=None)
    extrude(amount=CUT_EXTRUDE_11_DEPTH + CUT_EXTRUDE_11_DEPTH_BACK, mode=Mode.SUBTRACT)

    # 圆角1
    fillet_1_edges = [part.edges().sort_by_distance(p)[0] for p in [
        (74.5, 28.5, 1.5),
        (27.21294227, 10.5, 1.5),
        (72.78705773, 10.5, 1.5),
        (123, 10.5, 1.5),
        (25.5, 28.5, 1.5),
        (6, 28.5, 1.5),
        (6, 10.5, 1.5),
        (123, 28.5, 1.5),
    ]]
    fillet(fillet_1_edges, radius=FILLET_1_R)


solid = part.part
